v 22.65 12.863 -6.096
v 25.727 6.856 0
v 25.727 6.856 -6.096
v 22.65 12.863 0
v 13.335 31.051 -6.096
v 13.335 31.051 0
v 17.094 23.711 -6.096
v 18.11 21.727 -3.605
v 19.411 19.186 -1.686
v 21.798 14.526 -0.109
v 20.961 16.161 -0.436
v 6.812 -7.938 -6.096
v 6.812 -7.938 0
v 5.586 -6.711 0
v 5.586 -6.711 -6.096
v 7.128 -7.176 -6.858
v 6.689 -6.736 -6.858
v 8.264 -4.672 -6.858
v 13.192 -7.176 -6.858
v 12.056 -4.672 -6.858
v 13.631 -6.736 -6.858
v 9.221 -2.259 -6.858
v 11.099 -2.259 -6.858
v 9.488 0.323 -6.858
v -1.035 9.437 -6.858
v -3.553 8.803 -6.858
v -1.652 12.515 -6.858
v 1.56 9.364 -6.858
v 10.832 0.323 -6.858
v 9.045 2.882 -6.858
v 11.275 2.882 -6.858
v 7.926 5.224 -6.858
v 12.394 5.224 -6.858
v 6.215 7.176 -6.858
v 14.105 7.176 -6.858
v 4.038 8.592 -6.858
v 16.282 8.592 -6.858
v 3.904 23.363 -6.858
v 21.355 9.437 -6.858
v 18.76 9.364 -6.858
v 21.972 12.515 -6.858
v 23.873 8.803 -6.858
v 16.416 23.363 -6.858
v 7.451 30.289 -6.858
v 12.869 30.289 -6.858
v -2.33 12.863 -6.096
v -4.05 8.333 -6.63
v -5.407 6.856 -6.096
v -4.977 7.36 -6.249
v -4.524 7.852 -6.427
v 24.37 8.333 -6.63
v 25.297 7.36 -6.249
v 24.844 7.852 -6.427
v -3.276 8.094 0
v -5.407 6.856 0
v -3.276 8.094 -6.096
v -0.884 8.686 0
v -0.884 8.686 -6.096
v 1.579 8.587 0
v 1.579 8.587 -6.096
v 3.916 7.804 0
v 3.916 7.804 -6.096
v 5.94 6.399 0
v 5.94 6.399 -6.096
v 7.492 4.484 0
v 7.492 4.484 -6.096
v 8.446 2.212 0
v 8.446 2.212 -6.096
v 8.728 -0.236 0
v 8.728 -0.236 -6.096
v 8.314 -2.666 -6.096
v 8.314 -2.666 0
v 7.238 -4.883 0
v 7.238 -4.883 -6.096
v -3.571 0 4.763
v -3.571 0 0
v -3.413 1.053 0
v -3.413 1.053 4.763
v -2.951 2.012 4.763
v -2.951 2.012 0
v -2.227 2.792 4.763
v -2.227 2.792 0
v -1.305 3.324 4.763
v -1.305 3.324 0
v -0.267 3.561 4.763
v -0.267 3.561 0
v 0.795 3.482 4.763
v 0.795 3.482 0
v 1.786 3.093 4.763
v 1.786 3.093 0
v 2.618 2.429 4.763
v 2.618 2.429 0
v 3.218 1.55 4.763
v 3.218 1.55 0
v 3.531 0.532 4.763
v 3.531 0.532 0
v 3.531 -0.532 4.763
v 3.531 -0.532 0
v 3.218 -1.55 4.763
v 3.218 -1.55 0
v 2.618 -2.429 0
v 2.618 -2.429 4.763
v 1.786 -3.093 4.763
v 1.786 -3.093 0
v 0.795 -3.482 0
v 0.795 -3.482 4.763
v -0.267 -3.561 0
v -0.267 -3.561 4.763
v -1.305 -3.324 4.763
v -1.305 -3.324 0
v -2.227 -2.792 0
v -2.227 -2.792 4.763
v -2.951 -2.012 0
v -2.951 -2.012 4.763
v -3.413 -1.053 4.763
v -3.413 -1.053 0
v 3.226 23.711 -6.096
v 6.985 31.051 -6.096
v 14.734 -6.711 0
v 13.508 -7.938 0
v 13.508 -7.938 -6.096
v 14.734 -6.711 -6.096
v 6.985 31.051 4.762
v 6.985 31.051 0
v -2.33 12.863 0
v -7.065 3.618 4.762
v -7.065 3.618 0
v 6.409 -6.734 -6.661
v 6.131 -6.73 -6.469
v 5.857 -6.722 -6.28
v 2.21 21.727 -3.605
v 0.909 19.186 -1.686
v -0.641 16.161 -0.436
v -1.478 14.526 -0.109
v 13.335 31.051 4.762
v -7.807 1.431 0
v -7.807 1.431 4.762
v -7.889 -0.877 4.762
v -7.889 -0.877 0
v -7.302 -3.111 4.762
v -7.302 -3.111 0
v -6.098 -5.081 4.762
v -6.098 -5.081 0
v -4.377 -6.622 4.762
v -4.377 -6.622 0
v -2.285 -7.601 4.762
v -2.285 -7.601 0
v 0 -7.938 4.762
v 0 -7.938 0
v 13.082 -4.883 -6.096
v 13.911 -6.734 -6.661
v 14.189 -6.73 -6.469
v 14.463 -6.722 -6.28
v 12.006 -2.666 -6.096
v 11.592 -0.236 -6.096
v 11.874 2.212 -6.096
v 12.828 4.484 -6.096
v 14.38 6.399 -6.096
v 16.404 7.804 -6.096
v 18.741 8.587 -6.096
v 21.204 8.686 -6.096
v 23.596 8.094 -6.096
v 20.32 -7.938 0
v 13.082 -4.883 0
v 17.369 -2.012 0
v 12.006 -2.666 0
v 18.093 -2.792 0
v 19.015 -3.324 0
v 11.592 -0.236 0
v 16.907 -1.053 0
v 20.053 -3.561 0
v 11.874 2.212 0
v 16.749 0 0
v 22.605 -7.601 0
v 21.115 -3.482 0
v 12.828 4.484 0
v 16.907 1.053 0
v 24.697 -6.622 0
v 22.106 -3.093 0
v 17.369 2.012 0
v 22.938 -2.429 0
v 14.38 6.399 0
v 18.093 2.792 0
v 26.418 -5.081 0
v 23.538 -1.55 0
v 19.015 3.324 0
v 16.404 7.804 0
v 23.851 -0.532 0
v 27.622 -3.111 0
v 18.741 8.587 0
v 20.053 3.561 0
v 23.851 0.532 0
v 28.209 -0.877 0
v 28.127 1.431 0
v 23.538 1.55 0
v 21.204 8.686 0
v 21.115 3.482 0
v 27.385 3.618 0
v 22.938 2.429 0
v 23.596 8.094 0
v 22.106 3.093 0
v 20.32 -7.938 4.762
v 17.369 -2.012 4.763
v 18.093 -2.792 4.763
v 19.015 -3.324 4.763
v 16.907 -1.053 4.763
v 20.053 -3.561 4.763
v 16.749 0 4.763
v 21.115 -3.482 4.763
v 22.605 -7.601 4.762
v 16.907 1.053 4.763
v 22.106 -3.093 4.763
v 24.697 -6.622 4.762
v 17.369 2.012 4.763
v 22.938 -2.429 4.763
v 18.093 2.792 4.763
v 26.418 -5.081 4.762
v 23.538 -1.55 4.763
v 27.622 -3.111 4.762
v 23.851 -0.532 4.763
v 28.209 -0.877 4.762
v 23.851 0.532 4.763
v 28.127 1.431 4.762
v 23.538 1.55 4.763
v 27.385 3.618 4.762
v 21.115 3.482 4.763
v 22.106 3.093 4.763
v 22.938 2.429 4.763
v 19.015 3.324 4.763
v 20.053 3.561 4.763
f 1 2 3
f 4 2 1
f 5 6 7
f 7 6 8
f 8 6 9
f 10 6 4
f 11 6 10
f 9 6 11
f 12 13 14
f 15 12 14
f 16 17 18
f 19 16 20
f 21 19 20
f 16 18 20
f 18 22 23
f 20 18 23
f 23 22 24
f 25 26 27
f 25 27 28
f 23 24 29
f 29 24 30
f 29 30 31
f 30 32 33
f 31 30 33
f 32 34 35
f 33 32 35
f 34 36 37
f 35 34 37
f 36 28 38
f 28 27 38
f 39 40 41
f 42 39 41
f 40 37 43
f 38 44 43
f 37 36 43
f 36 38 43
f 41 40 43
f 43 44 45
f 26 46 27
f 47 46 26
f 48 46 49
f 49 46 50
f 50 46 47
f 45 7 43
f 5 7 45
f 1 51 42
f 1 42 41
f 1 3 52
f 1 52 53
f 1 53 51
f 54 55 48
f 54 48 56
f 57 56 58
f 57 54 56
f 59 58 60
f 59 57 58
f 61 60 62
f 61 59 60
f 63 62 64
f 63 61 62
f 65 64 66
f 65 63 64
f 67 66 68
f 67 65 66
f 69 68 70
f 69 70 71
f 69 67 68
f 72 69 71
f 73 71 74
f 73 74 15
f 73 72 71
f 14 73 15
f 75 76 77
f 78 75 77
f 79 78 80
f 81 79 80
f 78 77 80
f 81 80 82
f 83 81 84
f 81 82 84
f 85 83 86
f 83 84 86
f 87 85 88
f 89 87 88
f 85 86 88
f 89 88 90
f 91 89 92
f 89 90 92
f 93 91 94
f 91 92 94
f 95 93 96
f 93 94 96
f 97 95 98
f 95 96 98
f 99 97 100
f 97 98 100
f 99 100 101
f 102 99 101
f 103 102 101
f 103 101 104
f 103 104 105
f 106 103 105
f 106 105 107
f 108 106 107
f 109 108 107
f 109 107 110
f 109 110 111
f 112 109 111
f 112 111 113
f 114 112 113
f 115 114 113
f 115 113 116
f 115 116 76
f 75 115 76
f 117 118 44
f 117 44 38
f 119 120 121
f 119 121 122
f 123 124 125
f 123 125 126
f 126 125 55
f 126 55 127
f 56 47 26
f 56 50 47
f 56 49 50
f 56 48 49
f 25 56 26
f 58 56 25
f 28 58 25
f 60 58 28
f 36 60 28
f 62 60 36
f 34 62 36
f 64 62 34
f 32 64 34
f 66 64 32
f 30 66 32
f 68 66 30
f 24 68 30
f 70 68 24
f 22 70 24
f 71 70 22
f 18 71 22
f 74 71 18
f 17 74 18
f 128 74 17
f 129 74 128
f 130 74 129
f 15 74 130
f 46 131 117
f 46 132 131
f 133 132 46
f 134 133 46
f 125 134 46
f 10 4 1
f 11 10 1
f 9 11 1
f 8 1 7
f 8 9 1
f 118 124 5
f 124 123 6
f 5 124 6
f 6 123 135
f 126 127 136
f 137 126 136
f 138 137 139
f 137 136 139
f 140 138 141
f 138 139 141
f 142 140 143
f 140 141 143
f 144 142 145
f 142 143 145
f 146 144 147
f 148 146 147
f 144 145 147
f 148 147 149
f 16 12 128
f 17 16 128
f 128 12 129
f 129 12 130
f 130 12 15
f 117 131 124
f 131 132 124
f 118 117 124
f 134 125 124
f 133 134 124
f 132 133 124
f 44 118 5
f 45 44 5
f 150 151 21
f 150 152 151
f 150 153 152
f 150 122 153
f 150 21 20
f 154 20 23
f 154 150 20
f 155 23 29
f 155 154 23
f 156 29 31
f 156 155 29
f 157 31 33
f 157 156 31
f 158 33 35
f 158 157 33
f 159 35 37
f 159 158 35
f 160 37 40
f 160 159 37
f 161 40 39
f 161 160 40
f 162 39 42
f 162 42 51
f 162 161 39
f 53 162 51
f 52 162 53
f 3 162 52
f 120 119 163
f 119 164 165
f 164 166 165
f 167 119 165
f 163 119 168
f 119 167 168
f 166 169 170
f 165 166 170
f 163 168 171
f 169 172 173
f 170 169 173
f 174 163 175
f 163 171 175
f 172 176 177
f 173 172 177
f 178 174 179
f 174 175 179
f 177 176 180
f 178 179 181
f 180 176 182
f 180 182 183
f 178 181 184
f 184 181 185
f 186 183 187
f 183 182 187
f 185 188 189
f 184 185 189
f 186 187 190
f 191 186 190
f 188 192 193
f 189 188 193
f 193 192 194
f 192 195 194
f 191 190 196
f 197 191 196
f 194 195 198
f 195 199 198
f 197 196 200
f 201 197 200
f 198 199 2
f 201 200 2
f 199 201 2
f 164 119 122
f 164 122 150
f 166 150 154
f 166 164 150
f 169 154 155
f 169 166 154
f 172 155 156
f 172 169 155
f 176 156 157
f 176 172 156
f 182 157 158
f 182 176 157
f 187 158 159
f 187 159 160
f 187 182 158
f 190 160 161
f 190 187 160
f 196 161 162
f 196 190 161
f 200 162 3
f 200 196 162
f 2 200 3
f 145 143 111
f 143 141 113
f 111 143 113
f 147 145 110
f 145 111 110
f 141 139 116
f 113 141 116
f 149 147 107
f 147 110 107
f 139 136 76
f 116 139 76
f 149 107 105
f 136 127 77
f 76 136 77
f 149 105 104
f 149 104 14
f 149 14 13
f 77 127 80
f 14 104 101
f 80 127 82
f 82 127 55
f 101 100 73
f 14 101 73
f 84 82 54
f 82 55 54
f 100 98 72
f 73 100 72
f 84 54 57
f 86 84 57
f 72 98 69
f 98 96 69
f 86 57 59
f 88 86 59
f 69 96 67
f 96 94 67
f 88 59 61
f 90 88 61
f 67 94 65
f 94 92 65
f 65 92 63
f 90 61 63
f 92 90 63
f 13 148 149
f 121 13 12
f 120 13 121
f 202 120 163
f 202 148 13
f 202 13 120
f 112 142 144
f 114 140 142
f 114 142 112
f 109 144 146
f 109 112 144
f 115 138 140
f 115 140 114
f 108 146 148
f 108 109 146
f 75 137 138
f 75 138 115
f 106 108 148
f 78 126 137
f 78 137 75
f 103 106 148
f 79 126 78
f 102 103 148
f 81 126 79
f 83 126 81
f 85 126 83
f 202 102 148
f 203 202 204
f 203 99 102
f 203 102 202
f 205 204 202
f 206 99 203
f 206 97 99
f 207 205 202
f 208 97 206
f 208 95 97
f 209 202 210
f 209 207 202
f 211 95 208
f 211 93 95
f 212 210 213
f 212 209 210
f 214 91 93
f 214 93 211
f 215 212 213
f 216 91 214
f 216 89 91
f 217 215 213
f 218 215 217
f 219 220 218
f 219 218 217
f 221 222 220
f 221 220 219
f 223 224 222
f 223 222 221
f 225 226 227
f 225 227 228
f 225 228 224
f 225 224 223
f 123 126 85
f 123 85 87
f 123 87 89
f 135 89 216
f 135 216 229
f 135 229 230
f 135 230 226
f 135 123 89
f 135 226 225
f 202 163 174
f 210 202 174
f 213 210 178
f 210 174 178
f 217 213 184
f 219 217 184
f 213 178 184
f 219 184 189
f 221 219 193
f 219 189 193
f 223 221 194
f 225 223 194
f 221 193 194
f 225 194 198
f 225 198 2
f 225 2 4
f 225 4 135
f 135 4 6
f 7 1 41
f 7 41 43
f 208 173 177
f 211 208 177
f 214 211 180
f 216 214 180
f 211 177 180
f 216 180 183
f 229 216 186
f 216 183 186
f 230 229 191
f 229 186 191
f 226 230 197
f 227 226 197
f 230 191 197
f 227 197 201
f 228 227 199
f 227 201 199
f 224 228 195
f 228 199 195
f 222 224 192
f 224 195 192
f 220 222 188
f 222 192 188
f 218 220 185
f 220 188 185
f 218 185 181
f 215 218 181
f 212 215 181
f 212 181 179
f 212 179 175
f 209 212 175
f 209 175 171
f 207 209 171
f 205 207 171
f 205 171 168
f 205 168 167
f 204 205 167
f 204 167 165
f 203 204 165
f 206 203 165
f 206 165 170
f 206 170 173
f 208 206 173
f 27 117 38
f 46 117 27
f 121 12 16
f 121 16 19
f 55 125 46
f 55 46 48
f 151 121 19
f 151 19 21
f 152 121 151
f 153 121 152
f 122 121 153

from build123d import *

# Parameters (mm, degrees)
BOSS_EXTRUDE1_DEPTH     = 4.7625
F_1_4_CLEARANCE_HOLE1_D = 7.14248
BOSS_EXTRUDE2_DEPTH     = 6.858
DRAFT1_ANGLE            = 30
FILLET1_R               = 12.7
BOSS_EXTRUDE3_DEPTH     = 6.858
CHAMFER2_SIZE           = 3.175
CHAMFER3_SIZE           = 3.175
CHAMFER1_SIZE           = 0.762


with BuildPart() as part:
    # Sketch1 → Boss-Extrude1 (new body)
    with BuildSketch(Plane.XY):
        with BuildLine():
            Line((0, -7.9375), (20.32, -7.9375))
            ThreePointArc((20.32, -7.9375), (27.092168365, -4.140246597), (27.38480555, 3.61834614))
            Line((27.38480555, 3.61834614), (13.335, 31.050532116))
            Line((13.335, 31.050532116), (6.985, 31.050532116))
            Line((6.985, 31.050532116), (-7.06480555, 3.61834614))
            ThreePointArc((-7.06480555, 3.61834614), (-6.772168365, -4.140246597), (0, -7.9375))
        make_face()
    extrude(amount=BOSS_EXTRUDE1_DEPTH)

    # 1/4 Clearance Hole1 (through all)
    with Locations(Plane.XY.offset(4.7625)):
        with Locations((0, 0), (20.32, 0)):
            Hole(F_1_4_CLEARANCE_HOLE1_D / 2)

    # Sketch6 → Boss-Extrude2 (add)
    with BuildSketch(Plane(origin=(0, 0, 0), x_dir=(-1, 0, 0), z_dir=(0, 0, -1))):
        Polygon((-16.866941061, 24.154432116), (-3.453058939, 24.154432116), (-6.985, 31.050532116), (-13.335, 31.050532116), align=None)
    extrude(amount=BOSS_EXTRUDE2_DEPTH)

    # Draft1
    draft1_faces = [part.faces().sort_by_distance(p)[0] for p in [
        (10.16, 24.154432116, -3.429),
    ]]
    draft(draft1_faces, Plane(origin=(0, 0, -6.858), x_dir=(-1, 0, 0), z_dir=(0, 0, -1)), DRAFT1_ANGLE)

    # Fillet1
    fillet1_edges = [part.edges().sort_by_distance(p)[0] for p in [
        (10.16, 20.19496397, 0),
    ]]
    fillet(fillet1_edges, radius=FILLET1_R)

    # Sketch7 → Boss-Extrude3 (add)
    with BuildSketch(Plane(origin=(0, 0, 0), x_dir=(-1, 0, 0), z_dir=(0, 0, -1))):
        with BuildLine():
            Line((-16.866941061, 24.154432116), (-3.453058939, 24.154432116))
            Line((-3.453058939, 24.154432116), (2.330214301, 12.862615551))
            Line((2.330214301, 12.862615551), (5.406671043, 6.85584676))
            ThreePointArc((5.406671043, 6.85584676), (-7.449385202, 4.554271257), (-3.637419458, -7.9375))
            Line((-3.637419458, -7.9375), (-16.682580542, -7.9375))
            ThreePointArc((-16.682580542, -7.9375), (-12.870614798, 4.554271257), (-25.726671043, 6.85584676))
            Line((-25.726671043, 6.85584676), (-22.650214301, 12.862615551))
            Line((-22.650214301, 12.862615551), (-16.866941061, 24.154432116))
        make_face()
    extrude(amount=BOSS_EXTRUDE3_DEPTH)

    # Chamfer2
    # the kernel refuses this chamfer: 3.175, 2.394981568 mm, written as the material it takes off along each edge
    with BuildSketch(Plane(origin=(3.637419458, -7.9375, 0), x_dir=(1, 0, 0), z_dir=(0, 0, -1))) as chamfer2_piece_1:
        with BuildLine():
            Line((CHAMFER2_SIZE, 0), (1.948284876, -1.226715124))
            ThreePointArc((1.948284876, -1.226715124), (1.002646954, -0.541250257), (0, 0))
            Line((0, 0), (CHAMFER2_SIZE, 0))
        make_face()
    extrude(amount=15.023093487, mode=Mode.SUBTRACT)

    # Chamfer3
    # the kernel refuses this chamfer: 3.175, 2.394981568 mm, written as the material it takes off along each edge
    with BuildSketch(Plane(origin=(16.682580542, -7.9375, 0), x_dir=(-1, 0, 0), z_dir=(0, 0, -1))) as chamfer3_piece_1:
        with BuildLine():
            Line((CHAMFER3_SIZE, 0), (1.948284876, 1.226715124))
            ThreePointArc((1.948284876, 1.226715124), (1.002646954, 0.541250257), (0, 0))
            Line((0, 0), (CHAMFER3_SIZE, 0))
        make_face()
    extrude(amount=15.023093487, mode=Mode.SUBTRACT)

    # Chamfer1
    chamfer1_edges = [part.edges().sort_by_distance(p)[0] for p in [
        (13.53609355, 5.496666248, -6.858),
        (6.78390645, 5.496666248, -6.858),
        (6.199061896, -7.324142438, -6.858),
        (10.16, -7.9375, -6.858),
        (14.120938104, -7.324142438, -6.858),
        (19.530835521, 18.953189438, -6.858),
        (0.789164479, 18.953189438, -6.858),
        (10.16, 31.050532116, -6.858),
    ]]
    chamfer(chamfer1_edges, length=CHAMFER1_SIZE)


solid = part.part
